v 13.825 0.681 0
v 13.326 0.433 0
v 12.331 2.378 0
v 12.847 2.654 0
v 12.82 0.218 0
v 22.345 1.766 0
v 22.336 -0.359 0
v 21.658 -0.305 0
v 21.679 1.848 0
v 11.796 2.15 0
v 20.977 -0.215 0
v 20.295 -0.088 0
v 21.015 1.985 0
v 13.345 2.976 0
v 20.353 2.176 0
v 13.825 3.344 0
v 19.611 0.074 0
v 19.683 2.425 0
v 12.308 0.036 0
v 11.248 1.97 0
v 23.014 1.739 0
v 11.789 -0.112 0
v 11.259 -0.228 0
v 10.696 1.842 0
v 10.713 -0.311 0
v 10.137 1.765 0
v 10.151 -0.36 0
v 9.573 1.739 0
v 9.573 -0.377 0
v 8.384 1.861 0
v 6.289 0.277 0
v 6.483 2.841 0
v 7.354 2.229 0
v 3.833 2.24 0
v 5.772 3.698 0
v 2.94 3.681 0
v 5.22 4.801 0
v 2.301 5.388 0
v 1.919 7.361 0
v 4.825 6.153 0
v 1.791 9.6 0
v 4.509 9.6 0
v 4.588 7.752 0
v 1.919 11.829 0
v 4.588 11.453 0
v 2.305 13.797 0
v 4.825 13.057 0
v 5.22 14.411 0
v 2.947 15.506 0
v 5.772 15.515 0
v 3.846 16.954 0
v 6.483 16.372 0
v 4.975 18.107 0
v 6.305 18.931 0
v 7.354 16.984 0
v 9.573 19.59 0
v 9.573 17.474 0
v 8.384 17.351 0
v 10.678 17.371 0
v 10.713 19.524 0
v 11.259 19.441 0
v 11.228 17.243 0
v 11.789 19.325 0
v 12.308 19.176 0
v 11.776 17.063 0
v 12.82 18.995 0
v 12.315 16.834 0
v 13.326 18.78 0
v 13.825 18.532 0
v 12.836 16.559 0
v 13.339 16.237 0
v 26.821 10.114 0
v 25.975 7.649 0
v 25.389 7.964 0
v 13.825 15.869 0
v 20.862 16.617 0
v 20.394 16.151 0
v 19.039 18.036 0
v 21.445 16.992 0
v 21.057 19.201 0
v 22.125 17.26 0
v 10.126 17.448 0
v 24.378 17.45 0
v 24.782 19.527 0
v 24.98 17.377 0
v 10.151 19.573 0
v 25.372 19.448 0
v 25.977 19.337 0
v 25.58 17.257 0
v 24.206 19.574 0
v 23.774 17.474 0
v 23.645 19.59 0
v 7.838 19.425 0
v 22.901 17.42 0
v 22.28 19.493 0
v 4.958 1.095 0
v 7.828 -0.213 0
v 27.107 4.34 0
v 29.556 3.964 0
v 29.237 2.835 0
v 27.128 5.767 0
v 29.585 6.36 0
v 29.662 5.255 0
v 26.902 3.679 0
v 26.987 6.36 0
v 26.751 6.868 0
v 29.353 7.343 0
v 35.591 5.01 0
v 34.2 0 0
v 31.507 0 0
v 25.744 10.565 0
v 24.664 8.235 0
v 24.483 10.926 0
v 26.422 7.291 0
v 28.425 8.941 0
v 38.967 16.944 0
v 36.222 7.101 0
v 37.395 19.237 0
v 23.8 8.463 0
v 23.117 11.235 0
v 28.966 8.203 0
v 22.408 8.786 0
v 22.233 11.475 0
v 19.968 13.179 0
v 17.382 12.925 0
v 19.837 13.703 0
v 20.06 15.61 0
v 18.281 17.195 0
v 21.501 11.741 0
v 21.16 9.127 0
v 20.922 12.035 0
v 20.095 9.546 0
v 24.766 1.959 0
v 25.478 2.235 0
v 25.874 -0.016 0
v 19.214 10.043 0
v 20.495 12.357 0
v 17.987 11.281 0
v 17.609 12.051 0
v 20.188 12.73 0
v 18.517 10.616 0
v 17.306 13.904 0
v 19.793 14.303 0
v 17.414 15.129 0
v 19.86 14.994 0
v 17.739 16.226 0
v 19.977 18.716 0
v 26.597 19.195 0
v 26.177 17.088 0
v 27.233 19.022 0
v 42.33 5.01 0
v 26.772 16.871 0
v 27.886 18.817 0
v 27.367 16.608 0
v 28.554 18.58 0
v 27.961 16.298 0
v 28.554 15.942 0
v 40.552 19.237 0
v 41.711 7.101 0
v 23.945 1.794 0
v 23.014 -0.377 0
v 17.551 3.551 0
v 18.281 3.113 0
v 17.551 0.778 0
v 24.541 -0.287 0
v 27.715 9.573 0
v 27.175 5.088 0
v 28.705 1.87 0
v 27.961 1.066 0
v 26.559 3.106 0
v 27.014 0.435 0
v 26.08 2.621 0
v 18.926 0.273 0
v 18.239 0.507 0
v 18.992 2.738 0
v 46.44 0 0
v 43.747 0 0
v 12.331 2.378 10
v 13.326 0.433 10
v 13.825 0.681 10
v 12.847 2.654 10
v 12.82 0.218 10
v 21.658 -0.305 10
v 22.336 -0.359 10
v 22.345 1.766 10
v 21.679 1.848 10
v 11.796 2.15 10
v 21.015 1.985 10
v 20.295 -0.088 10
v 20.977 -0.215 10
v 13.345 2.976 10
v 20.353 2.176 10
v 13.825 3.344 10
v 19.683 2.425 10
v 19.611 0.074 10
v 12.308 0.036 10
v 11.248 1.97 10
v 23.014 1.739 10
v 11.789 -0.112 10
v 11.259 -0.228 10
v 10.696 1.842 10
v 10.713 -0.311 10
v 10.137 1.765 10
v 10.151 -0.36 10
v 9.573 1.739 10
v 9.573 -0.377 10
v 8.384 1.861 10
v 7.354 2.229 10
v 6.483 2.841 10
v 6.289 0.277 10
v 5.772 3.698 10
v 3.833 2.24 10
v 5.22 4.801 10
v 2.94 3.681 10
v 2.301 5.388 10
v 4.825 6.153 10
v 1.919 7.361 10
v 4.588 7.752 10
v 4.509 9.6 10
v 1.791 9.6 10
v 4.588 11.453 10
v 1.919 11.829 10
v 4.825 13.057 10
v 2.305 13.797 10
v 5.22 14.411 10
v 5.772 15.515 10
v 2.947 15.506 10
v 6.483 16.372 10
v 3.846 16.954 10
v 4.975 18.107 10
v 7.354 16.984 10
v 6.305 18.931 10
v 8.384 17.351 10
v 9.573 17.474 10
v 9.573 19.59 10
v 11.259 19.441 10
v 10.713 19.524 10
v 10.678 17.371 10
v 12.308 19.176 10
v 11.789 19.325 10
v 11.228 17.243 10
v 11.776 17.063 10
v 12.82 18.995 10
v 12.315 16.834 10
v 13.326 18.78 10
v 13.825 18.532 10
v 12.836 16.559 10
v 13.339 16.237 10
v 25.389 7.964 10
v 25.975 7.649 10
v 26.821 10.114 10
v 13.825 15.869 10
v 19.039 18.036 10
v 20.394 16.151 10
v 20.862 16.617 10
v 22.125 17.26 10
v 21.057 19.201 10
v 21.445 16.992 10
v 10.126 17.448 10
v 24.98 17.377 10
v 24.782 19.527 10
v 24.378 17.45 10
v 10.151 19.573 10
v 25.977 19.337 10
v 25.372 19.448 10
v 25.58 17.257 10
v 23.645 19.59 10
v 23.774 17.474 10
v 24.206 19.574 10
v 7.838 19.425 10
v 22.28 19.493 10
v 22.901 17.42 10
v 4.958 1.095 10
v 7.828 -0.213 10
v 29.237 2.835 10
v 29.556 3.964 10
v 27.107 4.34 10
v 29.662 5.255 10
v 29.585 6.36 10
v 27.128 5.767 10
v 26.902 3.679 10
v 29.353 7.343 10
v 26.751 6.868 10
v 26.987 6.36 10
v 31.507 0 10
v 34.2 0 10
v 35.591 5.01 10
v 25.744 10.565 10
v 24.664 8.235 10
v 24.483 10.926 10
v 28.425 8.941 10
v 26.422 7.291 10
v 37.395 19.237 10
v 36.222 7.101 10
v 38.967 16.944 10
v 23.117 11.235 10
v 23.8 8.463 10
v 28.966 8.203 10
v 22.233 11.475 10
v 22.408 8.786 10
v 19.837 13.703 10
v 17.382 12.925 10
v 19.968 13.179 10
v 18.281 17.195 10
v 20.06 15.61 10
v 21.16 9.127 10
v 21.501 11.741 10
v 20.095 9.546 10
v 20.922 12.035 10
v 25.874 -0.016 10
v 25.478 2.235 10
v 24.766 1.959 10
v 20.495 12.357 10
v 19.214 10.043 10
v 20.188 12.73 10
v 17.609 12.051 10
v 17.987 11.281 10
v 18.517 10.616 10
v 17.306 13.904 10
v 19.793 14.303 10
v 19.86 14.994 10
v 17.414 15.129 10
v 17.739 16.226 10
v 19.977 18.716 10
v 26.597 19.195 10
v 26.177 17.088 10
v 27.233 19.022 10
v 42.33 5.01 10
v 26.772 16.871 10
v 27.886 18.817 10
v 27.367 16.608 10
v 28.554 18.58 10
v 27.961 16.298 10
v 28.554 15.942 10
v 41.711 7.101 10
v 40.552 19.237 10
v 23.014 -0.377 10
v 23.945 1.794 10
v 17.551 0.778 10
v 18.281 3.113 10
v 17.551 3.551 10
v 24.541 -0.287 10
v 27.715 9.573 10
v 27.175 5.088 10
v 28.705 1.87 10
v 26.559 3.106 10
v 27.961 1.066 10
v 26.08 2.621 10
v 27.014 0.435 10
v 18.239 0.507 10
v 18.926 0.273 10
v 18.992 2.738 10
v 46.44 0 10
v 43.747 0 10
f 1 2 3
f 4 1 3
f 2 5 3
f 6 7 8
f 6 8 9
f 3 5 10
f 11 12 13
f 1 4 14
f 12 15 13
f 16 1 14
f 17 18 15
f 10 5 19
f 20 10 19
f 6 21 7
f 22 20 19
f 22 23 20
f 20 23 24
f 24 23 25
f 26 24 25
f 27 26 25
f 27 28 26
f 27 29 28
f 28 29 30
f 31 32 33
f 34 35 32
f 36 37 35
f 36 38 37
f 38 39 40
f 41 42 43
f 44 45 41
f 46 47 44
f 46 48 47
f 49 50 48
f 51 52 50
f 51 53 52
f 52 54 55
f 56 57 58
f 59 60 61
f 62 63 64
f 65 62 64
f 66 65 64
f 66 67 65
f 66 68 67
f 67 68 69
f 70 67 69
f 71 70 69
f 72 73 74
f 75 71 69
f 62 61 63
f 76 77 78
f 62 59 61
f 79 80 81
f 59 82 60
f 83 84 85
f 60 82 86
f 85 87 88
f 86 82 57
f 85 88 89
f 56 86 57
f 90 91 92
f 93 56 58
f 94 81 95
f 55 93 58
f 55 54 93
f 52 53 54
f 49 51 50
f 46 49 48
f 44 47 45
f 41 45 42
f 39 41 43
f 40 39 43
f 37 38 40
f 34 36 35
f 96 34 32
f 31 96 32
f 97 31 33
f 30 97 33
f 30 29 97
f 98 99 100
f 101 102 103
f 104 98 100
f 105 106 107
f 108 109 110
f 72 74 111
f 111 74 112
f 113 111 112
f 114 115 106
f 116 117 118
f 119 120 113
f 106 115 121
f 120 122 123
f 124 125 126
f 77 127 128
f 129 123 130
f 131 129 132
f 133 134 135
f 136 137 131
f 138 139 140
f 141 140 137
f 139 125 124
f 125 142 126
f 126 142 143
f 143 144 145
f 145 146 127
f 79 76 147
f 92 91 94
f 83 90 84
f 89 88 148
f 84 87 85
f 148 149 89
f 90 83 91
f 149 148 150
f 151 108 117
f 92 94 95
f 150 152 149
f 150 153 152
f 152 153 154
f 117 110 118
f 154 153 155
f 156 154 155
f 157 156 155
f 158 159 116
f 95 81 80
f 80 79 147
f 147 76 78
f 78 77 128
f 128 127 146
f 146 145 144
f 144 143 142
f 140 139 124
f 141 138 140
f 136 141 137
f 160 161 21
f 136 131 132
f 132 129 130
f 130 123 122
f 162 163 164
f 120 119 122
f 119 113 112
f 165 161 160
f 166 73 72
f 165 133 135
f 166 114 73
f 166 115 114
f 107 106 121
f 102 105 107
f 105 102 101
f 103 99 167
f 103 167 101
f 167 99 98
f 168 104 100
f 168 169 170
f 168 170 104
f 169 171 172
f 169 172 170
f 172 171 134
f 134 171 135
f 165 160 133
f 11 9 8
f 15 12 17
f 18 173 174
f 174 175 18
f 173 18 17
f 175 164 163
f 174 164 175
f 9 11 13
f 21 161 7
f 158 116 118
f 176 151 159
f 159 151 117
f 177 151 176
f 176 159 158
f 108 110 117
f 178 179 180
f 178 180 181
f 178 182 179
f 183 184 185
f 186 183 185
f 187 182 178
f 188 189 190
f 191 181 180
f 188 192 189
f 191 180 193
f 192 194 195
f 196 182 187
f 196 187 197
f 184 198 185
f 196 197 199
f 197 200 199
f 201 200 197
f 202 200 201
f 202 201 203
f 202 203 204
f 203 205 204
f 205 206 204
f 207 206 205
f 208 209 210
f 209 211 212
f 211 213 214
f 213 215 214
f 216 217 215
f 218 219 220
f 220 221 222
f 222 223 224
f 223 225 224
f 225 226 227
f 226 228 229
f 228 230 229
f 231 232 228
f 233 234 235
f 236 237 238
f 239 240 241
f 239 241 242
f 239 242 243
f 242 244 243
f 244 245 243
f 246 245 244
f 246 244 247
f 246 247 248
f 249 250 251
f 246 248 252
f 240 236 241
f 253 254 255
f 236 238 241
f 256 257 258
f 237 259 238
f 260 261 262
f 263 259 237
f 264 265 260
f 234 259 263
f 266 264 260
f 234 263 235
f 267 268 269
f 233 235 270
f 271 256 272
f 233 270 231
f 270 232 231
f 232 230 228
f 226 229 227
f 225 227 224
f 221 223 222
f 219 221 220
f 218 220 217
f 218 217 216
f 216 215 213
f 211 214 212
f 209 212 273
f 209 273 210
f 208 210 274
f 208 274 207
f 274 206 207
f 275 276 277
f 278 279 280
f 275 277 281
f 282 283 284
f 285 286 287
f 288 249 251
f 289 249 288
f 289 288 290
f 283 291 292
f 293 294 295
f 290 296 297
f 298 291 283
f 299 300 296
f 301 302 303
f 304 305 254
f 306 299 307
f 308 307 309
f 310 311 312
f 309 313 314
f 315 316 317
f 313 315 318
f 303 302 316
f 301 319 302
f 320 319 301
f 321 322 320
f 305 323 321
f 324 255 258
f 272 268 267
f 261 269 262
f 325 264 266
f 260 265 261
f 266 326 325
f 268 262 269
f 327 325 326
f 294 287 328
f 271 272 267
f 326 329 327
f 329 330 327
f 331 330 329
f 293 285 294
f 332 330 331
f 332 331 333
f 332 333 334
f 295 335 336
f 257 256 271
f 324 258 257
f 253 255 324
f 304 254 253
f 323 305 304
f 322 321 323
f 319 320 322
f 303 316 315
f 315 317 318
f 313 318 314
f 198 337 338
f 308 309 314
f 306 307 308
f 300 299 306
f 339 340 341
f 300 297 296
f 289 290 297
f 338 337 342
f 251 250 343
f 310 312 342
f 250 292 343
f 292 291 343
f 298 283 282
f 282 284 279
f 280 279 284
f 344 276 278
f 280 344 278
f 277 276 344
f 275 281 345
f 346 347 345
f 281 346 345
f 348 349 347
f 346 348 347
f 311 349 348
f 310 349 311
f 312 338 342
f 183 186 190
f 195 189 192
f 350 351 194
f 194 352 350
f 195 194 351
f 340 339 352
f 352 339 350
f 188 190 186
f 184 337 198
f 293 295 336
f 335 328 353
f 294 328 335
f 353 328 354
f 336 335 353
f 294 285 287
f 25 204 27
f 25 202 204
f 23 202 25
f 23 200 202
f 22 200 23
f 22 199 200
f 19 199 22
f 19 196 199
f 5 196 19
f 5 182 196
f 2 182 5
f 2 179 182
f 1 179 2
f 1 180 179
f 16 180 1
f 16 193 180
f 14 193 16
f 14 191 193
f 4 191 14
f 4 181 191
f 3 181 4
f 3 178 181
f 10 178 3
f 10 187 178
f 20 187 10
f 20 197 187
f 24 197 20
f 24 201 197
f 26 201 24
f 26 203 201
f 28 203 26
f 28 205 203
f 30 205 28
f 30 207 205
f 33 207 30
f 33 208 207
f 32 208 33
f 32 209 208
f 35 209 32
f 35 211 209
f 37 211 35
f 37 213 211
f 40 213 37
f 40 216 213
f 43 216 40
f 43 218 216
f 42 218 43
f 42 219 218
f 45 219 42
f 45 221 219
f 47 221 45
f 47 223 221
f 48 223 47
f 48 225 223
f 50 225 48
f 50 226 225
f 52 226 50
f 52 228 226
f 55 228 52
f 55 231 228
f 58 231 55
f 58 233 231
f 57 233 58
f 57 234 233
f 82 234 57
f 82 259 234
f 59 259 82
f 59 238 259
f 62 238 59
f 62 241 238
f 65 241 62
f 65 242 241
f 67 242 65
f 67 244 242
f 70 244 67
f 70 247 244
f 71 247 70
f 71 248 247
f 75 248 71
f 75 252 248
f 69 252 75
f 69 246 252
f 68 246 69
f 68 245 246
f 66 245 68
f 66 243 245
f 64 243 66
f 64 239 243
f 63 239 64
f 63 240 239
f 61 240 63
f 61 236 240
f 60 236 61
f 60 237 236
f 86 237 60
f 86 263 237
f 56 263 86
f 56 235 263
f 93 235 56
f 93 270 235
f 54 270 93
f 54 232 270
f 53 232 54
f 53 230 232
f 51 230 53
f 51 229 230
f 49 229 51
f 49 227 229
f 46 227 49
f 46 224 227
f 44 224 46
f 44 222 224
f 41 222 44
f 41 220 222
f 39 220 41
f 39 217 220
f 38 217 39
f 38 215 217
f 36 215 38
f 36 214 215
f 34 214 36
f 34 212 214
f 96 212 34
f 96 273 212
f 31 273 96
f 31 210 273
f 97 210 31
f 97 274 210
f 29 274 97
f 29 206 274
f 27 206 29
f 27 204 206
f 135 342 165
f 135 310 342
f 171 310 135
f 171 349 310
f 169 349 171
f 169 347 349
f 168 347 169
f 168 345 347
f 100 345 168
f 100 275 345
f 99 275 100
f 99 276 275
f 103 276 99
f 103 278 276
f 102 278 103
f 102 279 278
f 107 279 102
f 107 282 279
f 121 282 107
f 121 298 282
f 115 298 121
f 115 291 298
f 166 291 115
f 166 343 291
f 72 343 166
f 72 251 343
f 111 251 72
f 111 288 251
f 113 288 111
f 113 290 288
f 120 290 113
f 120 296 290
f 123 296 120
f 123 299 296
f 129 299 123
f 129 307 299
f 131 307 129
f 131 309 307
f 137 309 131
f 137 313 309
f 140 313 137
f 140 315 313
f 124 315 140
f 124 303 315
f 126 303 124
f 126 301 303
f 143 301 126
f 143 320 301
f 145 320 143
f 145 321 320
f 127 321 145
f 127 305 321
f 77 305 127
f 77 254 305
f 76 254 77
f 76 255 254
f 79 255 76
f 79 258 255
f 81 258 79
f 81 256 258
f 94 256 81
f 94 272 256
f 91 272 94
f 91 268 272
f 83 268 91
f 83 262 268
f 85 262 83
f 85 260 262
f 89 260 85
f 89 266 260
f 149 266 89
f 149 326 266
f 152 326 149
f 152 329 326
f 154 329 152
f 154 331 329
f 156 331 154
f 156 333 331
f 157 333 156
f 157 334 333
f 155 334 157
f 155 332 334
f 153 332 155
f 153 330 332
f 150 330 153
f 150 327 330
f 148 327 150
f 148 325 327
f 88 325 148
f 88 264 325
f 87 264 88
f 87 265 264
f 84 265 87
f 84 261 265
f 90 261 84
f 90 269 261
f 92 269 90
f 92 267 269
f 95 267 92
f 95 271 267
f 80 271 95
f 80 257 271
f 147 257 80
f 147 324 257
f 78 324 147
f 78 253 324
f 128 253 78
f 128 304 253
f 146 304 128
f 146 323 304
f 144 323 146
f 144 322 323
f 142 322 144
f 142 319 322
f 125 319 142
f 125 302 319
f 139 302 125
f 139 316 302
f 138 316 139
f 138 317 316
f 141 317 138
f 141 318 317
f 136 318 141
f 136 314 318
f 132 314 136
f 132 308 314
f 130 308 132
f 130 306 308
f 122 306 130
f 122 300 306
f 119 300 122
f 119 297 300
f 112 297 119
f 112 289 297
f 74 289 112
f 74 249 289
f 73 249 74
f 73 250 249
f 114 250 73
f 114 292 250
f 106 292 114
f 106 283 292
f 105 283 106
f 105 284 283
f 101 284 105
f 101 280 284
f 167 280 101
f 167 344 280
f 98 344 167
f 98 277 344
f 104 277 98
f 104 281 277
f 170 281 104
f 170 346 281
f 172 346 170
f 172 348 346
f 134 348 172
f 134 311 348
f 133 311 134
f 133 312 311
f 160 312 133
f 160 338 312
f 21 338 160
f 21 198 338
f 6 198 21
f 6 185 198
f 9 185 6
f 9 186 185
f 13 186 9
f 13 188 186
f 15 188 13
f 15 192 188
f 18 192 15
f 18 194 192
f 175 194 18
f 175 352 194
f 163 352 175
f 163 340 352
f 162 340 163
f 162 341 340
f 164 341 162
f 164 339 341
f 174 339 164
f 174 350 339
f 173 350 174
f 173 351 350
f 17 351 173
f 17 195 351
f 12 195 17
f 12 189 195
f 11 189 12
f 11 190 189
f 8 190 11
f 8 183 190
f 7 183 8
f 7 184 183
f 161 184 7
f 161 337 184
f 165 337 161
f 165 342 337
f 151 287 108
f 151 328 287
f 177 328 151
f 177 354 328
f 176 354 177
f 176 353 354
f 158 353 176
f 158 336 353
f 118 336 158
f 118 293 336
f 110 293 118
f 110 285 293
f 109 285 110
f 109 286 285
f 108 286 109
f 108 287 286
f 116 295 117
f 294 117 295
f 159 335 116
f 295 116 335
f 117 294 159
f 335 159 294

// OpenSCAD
linear_extrude(10)
    text("CSA", size=19, font="Monospace");
